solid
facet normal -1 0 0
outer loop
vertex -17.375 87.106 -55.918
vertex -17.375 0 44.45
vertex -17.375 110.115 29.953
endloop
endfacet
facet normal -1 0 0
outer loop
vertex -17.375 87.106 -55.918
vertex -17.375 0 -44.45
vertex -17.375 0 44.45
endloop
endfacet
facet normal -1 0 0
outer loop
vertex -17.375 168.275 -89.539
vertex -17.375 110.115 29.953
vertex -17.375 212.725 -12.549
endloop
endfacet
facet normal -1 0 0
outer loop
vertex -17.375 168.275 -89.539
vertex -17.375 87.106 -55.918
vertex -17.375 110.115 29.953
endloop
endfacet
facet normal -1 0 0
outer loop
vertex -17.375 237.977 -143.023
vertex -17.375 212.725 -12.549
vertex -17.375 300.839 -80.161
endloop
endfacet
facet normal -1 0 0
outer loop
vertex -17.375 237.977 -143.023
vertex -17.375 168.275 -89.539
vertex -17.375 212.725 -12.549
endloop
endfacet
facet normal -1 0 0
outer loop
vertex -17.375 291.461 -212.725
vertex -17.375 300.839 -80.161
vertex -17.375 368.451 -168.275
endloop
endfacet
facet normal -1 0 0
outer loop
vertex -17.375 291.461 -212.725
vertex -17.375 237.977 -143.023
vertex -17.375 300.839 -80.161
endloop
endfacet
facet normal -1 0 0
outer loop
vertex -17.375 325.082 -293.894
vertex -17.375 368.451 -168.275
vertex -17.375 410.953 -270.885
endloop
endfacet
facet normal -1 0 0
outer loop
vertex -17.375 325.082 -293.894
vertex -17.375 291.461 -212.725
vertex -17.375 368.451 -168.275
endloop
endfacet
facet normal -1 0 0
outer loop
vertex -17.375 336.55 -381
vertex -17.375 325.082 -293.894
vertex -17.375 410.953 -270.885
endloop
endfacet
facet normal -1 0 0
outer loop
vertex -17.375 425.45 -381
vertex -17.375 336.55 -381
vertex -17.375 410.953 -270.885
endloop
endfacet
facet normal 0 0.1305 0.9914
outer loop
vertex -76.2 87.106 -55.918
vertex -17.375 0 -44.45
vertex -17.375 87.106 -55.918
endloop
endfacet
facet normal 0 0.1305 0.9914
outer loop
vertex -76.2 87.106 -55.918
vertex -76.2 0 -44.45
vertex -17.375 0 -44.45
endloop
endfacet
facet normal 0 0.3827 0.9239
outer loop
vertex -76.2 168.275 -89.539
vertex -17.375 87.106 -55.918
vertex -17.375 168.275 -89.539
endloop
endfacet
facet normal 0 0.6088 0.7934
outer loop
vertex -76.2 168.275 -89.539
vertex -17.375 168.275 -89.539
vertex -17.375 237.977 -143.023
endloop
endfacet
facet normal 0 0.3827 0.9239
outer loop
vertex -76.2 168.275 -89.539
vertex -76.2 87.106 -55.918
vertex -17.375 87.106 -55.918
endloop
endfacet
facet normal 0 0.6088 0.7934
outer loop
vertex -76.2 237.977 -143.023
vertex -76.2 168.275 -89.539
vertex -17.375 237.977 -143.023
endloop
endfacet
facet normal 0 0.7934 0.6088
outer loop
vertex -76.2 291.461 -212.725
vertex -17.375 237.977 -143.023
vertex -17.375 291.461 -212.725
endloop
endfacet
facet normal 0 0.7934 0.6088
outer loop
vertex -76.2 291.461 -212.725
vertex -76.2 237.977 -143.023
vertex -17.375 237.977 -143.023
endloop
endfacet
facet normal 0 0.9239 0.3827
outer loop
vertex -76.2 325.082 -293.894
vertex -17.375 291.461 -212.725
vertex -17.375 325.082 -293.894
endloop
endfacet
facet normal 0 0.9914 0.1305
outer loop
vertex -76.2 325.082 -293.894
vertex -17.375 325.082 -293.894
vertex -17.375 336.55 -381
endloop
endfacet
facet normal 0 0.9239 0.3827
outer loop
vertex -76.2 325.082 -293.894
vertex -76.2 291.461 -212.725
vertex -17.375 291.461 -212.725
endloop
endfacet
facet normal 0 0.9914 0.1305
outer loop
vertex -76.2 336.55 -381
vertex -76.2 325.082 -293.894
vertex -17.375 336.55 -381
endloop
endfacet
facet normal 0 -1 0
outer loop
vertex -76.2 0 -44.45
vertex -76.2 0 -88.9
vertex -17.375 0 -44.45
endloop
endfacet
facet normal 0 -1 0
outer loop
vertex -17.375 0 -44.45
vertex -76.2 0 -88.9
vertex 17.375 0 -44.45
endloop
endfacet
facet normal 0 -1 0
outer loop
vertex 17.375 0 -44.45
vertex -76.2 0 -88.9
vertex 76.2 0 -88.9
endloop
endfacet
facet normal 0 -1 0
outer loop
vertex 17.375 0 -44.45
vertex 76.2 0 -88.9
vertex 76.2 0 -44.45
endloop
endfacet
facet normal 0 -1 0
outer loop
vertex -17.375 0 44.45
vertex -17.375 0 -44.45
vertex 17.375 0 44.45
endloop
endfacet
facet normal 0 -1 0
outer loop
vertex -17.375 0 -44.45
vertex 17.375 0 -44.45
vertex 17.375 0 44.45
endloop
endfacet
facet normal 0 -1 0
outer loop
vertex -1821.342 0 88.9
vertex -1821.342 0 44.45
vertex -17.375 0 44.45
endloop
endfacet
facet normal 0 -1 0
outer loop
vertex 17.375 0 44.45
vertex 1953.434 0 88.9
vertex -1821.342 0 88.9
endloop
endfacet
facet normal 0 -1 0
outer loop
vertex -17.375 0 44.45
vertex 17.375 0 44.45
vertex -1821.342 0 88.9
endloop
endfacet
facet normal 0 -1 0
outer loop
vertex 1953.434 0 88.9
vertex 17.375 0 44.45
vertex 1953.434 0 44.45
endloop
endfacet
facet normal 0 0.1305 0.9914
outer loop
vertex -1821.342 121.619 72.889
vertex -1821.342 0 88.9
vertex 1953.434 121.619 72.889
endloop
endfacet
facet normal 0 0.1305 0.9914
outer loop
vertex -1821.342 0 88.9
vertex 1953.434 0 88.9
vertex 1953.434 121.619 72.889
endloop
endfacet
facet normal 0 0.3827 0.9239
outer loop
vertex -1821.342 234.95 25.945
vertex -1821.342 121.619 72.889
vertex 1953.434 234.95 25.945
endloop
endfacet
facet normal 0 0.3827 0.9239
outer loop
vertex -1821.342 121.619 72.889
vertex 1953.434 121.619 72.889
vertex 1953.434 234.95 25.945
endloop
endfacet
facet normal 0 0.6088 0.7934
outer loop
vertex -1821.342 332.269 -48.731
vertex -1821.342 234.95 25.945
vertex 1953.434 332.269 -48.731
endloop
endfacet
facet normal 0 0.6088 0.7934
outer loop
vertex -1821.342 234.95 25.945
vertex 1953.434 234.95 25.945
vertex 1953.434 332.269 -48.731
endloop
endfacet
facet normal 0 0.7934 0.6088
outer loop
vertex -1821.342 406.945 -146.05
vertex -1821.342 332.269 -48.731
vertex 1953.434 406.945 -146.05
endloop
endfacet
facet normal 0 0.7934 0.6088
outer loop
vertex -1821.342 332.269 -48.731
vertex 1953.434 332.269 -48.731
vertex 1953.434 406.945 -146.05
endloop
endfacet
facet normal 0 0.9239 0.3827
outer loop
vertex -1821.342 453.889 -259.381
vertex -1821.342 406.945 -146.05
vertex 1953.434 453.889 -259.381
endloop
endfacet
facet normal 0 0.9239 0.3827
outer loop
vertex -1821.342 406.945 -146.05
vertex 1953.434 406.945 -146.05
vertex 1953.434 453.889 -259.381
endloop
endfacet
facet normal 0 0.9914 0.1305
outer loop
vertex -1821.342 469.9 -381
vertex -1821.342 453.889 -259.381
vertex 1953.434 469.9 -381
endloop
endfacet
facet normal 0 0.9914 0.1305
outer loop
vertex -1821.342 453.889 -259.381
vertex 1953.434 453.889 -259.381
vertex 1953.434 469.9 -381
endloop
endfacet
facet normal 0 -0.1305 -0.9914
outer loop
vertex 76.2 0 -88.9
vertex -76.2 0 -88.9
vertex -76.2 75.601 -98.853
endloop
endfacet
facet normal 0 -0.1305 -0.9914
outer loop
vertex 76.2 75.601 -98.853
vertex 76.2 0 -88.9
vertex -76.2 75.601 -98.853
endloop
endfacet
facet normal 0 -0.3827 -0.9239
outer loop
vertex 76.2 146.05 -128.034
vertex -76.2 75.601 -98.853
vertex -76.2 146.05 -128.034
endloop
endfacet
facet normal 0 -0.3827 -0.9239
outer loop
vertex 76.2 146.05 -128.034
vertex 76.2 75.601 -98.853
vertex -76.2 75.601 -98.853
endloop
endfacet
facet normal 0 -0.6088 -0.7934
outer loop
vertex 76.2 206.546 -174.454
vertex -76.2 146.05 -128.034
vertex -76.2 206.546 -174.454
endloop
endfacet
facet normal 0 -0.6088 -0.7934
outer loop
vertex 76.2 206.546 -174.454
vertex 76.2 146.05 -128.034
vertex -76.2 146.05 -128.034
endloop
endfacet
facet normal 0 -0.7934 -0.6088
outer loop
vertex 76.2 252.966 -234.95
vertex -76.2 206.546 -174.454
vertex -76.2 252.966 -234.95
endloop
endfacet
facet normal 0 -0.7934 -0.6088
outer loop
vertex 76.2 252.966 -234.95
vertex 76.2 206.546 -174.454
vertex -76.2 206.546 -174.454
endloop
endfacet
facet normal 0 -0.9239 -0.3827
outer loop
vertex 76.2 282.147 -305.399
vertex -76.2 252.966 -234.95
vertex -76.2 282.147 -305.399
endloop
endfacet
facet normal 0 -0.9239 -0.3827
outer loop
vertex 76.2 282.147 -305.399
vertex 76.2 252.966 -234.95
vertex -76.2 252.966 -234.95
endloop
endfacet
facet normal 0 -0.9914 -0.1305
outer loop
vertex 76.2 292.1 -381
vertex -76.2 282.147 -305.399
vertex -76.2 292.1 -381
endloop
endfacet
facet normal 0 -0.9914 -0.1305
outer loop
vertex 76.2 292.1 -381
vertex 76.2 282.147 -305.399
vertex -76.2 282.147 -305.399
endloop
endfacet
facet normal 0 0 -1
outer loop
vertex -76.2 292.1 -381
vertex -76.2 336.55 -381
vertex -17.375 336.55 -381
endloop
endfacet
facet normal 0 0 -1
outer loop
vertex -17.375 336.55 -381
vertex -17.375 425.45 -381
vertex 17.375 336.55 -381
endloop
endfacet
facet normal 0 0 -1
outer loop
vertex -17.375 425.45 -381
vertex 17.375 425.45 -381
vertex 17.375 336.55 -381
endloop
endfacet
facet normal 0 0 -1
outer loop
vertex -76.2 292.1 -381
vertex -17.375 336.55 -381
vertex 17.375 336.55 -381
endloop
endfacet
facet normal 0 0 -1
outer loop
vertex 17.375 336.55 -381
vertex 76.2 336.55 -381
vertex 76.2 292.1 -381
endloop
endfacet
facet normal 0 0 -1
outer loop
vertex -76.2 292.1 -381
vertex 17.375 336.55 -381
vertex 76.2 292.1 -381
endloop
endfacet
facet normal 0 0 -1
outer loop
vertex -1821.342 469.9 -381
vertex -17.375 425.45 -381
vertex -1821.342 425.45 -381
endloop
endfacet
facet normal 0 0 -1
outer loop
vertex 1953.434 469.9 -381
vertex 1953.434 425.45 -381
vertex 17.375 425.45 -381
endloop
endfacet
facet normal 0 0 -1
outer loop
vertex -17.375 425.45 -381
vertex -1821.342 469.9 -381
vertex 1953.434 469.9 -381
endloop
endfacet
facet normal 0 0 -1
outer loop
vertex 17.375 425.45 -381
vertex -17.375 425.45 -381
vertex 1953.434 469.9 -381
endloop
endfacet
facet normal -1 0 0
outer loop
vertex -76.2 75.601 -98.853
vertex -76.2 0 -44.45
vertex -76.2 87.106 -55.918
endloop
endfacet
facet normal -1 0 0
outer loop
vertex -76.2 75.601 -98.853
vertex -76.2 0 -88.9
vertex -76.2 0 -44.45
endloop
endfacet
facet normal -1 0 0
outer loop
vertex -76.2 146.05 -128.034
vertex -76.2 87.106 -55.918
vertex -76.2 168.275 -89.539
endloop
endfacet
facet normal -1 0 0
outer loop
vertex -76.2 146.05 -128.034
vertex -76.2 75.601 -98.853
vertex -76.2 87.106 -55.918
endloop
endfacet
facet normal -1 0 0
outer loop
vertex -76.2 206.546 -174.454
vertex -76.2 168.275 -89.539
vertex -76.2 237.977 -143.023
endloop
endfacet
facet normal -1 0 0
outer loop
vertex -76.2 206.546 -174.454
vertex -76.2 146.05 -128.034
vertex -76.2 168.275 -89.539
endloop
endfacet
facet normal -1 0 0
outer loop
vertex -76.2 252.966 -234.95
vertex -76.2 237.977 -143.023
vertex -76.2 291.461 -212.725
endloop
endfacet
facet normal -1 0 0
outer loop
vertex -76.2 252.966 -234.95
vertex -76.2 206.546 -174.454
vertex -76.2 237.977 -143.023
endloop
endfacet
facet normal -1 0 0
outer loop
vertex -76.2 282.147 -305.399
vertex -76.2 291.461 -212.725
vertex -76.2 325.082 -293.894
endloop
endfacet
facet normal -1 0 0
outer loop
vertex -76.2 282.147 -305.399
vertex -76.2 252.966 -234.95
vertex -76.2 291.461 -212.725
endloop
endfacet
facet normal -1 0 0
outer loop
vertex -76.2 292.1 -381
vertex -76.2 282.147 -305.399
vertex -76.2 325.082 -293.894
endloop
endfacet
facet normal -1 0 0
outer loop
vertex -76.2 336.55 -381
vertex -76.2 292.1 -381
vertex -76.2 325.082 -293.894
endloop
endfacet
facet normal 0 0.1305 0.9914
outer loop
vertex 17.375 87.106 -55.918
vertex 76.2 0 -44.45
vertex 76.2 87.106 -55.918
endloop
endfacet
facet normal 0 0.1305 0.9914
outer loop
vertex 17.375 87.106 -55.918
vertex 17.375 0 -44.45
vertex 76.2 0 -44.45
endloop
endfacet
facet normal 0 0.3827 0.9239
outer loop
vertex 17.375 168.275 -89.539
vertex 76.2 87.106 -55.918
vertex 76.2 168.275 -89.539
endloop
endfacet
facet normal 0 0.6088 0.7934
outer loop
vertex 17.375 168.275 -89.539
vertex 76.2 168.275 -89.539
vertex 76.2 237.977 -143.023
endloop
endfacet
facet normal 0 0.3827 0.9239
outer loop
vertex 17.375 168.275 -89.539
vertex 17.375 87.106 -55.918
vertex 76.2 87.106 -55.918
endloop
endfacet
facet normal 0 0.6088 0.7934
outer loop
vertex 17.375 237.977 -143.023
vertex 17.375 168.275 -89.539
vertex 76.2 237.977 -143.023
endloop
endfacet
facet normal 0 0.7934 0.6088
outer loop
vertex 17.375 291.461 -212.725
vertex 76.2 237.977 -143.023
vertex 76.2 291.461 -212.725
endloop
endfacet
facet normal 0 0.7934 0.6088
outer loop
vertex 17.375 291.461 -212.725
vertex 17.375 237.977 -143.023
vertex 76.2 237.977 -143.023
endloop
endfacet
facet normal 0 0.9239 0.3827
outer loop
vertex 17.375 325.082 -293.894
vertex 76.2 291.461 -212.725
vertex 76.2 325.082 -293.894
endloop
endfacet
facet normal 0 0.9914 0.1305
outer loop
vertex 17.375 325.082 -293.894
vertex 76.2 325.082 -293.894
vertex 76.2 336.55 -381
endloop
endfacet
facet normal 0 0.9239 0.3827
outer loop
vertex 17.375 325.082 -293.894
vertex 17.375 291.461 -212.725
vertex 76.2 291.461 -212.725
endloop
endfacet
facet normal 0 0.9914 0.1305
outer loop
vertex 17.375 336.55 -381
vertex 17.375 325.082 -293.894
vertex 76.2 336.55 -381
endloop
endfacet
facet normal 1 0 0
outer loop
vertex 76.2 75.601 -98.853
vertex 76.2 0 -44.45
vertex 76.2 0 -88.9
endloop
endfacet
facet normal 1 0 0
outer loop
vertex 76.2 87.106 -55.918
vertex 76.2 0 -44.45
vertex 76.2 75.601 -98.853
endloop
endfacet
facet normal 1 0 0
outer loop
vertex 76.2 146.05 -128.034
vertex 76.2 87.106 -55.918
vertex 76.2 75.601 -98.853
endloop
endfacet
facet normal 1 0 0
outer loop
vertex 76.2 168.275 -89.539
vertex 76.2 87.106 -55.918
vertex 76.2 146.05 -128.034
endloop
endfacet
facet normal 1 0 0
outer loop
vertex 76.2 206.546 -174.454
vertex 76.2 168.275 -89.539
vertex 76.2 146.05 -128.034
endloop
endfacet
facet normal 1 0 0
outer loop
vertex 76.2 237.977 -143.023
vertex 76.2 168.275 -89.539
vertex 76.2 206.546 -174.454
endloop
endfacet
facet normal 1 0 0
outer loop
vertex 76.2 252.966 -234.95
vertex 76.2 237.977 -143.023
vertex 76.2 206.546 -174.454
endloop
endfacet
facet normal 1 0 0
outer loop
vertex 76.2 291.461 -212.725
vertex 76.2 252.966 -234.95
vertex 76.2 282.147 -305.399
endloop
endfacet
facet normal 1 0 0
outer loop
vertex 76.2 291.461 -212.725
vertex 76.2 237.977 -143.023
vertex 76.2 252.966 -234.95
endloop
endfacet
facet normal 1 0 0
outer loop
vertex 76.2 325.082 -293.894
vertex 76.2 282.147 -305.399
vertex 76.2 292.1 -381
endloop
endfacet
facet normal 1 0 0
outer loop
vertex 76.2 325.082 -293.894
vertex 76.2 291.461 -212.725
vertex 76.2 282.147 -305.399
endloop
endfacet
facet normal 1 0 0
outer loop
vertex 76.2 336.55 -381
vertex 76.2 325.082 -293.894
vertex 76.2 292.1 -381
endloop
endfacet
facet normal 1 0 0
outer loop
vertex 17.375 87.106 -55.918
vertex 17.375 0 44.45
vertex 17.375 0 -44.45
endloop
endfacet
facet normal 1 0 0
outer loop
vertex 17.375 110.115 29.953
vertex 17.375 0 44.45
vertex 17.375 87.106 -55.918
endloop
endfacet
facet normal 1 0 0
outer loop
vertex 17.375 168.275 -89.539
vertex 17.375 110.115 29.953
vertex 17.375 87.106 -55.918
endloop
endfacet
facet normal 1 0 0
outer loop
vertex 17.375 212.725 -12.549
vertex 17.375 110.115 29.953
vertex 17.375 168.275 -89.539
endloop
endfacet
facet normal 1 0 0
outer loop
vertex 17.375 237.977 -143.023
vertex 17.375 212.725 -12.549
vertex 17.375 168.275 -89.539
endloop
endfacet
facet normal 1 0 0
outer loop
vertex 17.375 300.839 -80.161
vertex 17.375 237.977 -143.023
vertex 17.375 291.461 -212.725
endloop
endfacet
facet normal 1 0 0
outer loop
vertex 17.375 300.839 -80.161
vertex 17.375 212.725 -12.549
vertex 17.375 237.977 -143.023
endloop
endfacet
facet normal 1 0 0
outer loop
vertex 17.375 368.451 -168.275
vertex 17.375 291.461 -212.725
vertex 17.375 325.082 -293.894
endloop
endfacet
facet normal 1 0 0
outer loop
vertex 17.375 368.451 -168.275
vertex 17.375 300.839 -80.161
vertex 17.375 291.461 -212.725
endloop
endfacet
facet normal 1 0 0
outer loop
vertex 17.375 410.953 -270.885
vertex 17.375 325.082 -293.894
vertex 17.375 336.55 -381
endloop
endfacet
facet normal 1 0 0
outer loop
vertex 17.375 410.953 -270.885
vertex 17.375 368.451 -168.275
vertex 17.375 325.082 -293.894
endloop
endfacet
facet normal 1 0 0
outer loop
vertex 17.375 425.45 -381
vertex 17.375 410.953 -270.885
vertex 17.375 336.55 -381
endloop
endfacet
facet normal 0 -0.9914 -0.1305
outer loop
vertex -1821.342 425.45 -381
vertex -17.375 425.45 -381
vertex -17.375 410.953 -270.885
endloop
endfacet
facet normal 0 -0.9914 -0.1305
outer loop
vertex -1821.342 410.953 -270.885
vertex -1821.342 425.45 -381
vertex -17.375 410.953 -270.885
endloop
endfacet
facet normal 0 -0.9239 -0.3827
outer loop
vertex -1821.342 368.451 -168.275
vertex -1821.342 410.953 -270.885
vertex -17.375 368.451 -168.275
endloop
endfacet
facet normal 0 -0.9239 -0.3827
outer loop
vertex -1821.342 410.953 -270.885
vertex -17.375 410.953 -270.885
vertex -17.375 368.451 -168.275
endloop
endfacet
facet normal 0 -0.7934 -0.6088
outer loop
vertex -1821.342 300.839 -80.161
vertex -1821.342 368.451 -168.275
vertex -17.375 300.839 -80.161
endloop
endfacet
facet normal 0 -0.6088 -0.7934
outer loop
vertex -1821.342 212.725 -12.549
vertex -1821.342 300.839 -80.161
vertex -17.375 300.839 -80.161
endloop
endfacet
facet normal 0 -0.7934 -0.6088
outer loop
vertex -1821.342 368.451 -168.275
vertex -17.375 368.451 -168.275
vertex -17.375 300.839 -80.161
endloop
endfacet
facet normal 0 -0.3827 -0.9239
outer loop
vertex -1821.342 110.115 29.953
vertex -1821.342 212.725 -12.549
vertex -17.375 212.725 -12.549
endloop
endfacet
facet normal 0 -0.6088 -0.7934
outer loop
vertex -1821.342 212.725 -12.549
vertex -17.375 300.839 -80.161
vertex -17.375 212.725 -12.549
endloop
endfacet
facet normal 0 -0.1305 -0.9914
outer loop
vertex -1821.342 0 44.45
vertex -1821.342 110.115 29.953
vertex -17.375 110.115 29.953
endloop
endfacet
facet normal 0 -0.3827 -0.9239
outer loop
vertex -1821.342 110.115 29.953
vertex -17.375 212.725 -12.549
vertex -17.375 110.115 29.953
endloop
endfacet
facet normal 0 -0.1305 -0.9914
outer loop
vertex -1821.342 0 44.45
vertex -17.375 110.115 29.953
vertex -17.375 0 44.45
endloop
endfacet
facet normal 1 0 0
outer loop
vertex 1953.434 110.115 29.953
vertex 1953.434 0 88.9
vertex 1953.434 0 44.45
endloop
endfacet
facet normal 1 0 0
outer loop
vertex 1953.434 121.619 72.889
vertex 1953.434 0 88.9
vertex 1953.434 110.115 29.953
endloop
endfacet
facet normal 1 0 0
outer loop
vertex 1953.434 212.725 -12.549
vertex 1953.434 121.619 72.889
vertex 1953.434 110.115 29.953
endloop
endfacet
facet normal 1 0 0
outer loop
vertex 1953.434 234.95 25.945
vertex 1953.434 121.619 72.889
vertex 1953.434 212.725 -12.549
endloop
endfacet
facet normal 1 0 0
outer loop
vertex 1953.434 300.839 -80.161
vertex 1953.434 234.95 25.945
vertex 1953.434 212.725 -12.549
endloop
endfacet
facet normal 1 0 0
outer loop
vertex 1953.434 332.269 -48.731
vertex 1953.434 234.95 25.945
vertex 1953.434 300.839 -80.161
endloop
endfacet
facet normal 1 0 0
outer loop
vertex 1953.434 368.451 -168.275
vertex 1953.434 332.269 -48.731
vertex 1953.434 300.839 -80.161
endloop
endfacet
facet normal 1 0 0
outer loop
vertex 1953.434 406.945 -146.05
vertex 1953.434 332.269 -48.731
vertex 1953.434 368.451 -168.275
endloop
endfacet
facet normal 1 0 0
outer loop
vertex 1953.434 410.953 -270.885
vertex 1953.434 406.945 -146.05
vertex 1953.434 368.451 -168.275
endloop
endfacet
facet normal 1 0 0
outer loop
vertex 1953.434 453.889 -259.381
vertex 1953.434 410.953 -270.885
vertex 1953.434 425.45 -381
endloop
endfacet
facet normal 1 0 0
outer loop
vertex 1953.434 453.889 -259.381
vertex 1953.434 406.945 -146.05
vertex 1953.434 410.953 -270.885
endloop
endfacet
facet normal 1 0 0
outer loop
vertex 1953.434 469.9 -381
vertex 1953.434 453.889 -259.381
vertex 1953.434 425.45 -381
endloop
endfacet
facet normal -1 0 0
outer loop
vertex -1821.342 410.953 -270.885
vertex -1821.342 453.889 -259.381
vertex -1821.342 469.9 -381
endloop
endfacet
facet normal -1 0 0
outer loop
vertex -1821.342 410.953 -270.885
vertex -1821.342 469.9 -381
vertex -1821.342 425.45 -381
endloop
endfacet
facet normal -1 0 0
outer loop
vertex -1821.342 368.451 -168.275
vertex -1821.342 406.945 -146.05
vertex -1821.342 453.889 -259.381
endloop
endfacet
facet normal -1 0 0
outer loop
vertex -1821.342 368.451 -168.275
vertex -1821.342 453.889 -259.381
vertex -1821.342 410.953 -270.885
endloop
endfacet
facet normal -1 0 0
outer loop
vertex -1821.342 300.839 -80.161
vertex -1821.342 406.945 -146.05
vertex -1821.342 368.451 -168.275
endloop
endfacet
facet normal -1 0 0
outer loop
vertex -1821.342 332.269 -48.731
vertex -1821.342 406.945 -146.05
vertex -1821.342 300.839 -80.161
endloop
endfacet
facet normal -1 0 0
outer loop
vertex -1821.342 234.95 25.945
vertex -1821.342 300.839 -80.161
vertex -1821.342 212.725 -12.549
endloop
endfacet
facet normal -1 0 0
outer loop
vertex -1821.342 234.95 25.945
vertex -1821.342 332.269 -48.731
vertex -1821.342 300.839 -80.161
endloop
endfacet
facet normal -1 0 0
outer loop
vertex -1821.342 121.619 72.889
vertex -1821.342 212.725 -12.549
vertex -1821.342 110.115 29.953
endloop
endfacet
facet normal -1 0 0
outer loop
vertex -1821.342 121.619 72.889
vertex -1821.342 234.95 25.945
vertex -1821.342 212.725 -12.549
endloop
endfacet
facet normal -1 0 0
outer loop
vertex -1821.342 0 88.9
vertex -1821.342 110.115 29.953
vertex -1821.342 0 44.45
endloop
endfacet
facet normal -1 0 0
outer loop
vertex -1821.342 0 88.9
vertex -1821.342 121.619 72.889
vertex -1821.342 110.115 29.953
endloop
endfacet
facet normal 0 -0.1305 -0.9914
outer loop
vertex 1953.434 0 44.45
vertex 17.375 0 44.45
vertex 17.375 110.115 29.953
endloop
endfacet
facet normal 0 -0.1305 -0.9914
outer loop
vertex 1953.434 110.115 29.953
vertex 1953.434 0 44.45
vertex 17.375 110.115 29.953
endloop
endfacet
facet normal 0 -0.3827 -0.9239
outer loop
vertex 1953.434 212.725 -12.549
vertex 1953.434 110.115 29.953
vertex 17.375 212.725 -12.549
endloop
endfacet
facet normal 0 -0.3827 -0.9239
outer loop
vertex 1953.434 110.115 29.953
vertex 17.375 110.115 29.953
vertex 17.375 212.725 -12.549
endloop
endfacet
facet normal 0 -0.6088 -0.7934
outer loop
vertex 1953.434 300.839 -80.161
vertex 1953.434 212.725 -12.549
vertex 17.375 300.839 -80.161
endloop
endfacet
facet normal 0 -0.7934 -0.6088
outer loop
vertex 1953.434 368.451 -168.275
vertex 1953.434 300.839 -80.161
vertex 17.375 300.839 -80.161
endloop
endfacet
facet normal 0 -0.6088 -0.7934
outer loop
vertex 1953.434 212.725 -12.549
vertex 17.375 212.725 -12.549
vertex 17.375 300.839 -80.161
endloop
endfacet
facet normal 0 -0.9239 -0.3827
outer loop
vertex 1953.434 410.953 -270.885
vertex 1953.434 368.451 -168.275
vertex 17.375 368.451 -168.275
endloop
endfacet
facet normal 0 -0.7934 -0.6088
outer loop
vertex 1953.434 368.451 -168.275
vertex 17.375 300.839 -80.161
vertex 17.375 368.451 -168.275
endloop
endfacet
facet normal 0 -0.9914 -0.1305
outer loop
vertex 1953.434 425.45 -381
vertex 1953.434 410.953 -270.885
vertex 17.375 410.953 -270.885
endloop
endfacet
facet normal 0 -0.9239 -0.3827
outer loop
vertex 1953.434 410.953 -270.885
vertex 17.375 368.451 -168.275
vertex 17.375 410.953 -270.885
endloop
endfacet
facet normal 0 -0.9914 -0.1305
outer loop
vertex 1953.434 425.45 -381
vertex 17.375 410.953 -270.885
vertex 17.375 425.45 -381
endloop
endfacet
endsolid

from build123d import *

# Parameters (mm, degrees)
F4_DEPTH = 1877.2339820862
F5_DEPTH = 1745.1422214508


# Not quite as in the source:
# - a feature of the source that left no trace in its solid (it failed there, or was rolled back) is left out


with BuildPart() as f2:
    # F2: sweep along a path in F1
    with BuildLine(Plane.YZ) as f2_path:
        ThreePointArc((0, 0), (269.4076836321, -111.5923163679), (381, -381))
    # F0 (on Front) → F2 (sweep)
    with BuildSketch(Plane.XZ):
        Polygon((76.2, 88.9), (0, 88.9), (-76.2, 88.9), (-76.2, 44.45), (-17.3748321831, 44.45), (-17.3748321831, 0), (-17.3748321831, -44.45), (-76.2, -44.45), (-76.2, -88.9), (0, -88.9), (76.2, -88.9), (76.2, -44.45), (17.3748321831, -44.45), (17.3748321831, 0), (17.3748321831, 44.45), (76.2, 44.45), align=None)
    sweep(path=f2_path.line)

    # F4 (add): a face of the model
    f4_faces = [f2.faces().sort_by_distance(p)[0] for p in [
        (76.2, 305.5375800558, -75.4624199442),
    ]]
    extrude(f4_faces, amount=F4_DEPTH)

    # F3 (on face) → F5 (join)
    with BuildSketch(Plane(origin=(-76.2, 0, 0), x_dir=(0, -1, 0), z_dir=(-1, 0, 0))):
        with BuildLine():
            Line((0, 44.45), (0, 88.9))
            ThreePointArc((0, 88.9), (-332.2694764796, -48.7305235204), (-469.9, -381))
            Line((-469.9, -381), (-425.45, -381))
            ThreePointArc((-425.45, -381), (-300.8385800558, -80.1614199442), (0, 44.45))
        make_face()
    extrude(amount=F5_DEPTH)


solid = f2.part
